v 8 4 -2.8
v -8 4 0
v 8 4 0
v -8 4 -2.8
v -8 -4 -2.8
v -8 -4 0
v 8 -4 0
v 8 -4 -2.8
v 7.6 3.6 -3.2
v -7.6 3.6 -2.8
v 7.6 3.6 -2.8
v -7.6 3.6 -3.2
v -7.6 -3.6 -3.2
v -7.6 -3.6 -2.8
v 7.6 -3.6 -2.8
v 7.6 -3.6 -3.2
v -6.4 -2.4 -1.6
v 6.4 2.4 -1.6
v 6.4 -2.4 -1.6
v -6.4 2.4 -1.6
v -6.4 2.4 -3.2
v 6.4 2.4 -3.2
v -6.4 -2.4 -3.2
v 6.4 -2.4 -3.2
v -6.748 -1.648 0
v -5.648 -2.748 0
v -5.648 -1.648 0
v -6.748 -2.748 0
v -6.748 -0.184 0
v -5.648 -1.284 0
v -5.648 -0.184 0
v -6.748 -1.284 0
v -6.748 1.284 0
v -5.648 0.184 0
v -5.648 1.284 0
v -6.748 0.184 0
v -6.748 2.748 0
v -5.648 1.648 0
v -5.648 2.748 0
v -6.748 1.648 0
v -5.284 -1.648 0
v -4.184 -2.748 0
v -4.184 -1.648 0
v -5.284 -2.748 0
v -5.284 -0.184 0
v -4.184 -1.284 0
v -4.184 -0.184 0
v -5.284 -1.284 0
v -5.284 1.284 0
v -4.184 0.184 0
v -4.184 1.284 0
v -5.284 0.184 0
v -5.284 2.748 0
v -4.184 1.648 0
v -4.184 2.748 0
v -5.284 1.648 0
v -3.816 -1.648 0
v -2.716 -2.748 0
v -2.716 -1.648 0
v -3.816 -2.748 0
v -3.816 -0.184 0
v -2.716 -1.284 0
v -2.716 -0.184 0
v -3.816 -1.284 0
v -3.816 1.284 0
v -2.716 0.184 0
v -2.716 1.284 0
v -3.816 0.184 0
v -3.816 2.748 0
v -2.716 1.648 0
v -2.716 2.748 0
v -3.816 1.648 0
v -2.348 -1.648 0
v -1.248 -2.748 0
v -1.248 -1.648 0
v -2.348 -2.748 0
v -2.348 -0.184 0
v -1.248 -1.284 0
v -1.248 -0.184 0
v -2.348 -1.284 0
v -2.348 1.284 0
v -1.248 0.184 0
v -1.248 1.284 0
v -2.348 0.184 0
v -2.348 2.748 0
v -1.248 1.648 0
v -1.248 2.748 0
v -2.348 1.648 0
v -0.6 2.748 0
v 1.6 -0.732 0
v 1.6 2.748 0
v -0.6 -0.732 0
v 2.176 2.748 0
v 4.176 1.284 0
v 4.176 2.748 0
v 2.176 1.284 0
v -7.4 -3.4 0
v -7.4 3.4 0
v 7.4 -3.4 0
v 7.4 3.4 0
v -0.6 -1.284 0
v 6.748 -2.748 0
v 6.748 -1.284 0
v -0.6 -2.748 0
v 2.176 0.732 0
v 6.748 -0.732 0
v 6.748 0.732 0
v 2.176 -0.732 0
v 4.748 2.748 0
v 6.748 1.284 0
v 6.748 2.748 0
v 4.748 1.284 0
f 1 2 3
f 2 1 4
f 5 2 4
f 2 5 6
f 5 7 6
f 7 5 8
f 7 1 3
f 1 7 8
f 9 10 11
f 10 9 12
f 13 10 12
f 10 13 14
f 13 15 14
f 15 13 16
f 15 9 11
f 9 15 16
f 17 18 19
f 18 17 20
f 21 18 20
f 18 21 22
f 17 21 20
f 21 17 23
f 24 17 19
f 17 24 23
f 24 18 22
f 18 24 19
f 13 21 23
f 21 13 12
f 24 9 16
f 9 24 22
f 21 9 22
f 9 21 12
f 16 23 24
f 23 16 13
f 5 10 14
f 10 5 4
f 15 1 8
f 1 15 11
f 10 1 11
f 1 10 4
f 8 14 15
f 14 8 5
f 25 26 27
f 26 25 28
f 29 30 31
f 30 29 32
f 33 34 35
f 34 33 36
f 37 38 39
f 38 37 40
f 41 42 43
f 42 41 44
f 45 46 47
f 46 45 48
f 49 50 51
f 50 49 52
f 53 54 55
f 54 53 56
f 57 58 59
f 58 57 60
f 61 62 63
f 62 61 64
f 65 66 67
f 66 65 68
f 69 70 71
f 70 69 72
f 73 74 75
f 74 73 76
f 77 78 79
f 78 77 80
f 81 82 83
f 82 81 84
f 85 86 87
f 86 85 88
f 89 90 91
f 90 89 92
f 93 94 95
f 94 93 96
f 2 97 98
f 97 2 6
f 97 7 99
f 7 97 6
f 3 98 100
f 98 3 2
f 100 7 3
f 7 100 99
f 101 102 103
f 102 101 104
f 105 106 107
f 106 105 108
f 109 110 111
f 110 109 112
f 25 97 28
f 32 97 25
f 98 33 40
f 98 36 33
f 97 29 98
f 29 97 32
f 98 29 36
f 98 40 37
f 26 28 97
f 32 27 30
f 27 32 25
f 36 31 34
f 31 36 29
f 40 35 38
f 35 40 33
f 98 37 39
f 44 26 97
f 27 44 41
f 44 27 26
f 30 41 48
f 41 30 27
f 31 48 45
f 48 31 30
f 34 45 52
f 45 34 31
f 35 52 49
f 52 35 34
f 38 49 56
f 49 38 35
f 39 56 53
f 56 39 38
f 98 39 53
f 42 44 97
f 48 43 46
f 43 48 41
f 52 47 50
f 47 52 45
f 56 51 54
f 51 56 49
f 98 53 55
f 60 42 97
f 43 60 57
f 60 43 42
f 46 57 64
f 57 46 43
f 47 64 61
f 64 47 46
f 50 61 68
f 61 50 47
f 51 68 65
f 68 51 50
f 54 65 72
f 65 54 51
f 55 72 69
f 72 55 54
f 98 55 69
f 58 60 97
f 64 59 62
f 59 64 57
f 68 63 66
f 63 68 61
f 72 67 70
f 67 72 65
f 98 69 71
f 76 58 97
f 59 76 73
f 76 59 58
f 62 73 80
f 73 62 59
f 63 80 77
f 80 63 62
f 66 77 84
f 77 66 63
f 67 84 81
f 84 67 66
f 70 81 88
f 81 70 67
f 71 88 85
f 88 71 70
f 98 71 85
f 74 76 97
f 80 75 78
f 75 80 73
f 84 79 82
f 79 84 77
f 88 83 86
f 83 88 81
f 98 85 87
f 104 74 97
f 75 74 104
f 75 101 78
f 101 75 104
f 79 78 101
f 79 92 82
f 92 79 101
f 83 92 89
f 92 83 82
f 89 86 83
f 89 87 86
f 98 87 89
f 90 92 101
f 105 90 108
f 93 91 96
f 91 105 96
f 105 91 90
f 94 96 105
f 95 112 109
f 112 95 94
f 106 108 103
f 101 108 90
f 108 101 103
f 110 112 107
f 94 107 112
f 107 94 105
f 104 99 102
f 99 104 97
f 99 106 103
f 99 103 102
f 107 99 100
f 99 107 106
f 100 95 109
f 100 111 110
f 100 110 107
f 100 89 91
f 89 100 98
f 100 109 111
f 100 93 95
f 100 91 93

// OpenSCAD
// file: ../p/4-4edge.scad
use <../lib.scad>
$fa=1; $fs=0.2;
function ldraw_lib__4_4edge(realsolid=false) = [
// 0 Circle 1.0
// 0 Name: 4-4edge.dat
// 0 Author: James Jessiman
// 0 !LDRAW_ORG Primitive UPDATE 2017-01
// 0 !LICENSE Licensed under CC BY 2.0 and CC BY 4.0 : see CAreadme.txt
// 
// 0 BFC CERTIFY CCW
  [0,"BFC","CERTIFY"],
  [0,"BFC","CCW"],
// 
// 0 !HISTORY 1998-12-15 [PTadmin] Official Update 1998-10
// 0 !HISTORY 2005-12-28 [PTadmin] Official Update 2005-01
// 0 !HISTORY 2007-06-24 [PTadmin] Header formatted for Contributor Agreement
// 0 !HISTORY 2008-07-01 [PTadmin] Official Update 2008-01
// 0 !HISTORY 2017-01-15 [Steffen] BFCed
// 0 !HISTORY 2017-12-30 [PTadmin] Official Update 2017-01
// 
// 
// 2 24 1 0 0 0.9239 0 0.3827
  [2,24,1,0,0,0.9239,0,0.3827],
// 2 24 0.9239 0 0.3827 0.7071 0 0.7071
  [2,24,0.9239,0,0.3827,0.7071,0,0.7071],
// 2 24 0.7071 0 0.7071 0.3827 0 0.9239
  [2,24,0.7071,0,0.7071,0.3827,0,0.9239],
// 2 24 0.3827 0 0.9239 0 0 1
  [2,24,0.3827,0,0.9239,0,0,1],
// 2 24 0 0 1 -0.3827 0 0.9239
  [2,24,0,0,1,-0.3827,0,0.9239],
// 2 24 -0.3827 0 0.9239 -0.7071 0 0.7071
  [2,24,-0.3827,0,0.9239,-0.7071,0,0.7071],
// 2 24 -0.7071 0 0.7071 -0.9239 0 0.3827
  [2,24,-0.7071,0,0.7071,-0.9239,0,0.3827],
// 2 24 -0.9239 0 0.3827 -1 0 -0
  [2,24,-0.9239,0,0.3827,-1,0,-0],
// 2 24 -1 0 -0 -0.9239 0 -0.3827
  [2,24,-1,0,-0,-0.9239,0,-0.3827],
// 2 24 -0.9239 0 -0.3827 -0.7071 0 -0.7071
  [2,24,-0.9239,0,-0.3827,-0.7071,0,-0.7071],
// 2 24 -0.7071 0 -0.7071 -0.3827 0 -0.9239
  [2,24,-0.7071,0,-0.7071,-0.3827,0,-0.9239],
// 2 24 -0.3827 0 -0.9239 0 0 -1
  [2,24,-0.3827,0,-0.9239,0,0,-1],
// 2 24 0 0 -1 0.3827 0 -0.9239
  [2,24,0,0,-1,0.3827,0,-0.9239],
// 2 24 0.3827 0 -0.9239 0.7071 0 -0.7071
  [2,24,0.3827,0,-0.9239,0.7071,0,-0.7071],
// 2 24 0.7071 0 -0.7071 0.9239 0 -0.3827
  [2,24,0.7071,0,-0.7071,0.9239,0,-0.3827],
// 2 24 0.9239 0 -0.3827 1 0 0
  [2,24,0.9239,0,-0.3827,1,0,0],
];
module ldraw_lib__4_4edge(step=0, col=false, unit=2/5, alt=false, line=0.2, solid=!$preview)
    makepoly(ldraw_lib__4_4edge(solid), step=step, col=col, unit=unit, alt=alt, line=line, solid=solid);
ldraw_lib__4_4edge(line=0.2);
// file: ../p/4-4disc.scad
use <../lib.scad>
$fa=1; $fs=0.2;
function ldraw_lib__4_4disc(realsolid=false) = [
// 0 Disc 1.0
// 0 Name: 4-4disc.dat
// 0 Author: James Jessiman
// 0 !LDRAW_ORG Primitive UPDATE 2002-02
// 0 !LICENSE Licensed under CC BY 2.0 and CC BY 4.0 : see CAreadme.txt
// 
// 0 BFC CERTIFY CCW
  [0,"BFC","CERTIFY"],
  [0,"BFC","CCW"],
// 
// 0 !HISTORY 1998-12-15 [PTadmin] Official Update 1998-10
// 0 !HISTORY 2002-03-23 [sbliss] Added BFC statement
// 0 !HISTORY 2002-04-25 [PTadmin] Official Update 2002-02
// 0 !HISTORY 2007-06-24 [PTadmin] Header formatted for Contributor Agreement
// 0 !HISTORY 2008-07-01 [PTadmin] Official Update 2008-01
// 
// 
// 3 16 0 0 0 1 0 0 0.9239 0 0.3827
  [3,16,0,0,0,1,0,0,0.9239,0,0.3827],
// 3 16 0 0 0 0.9239 0 0.3827 0.7071 0 0.7071
  [3,16,0,0,0,0.9239,0,0.3827,0.7071,0,0.7071],
// 3 16 0 0 0 0.7071 0 0.7071 0.3827 0 0.9239
  [3,16,0,0,0,0.7071,0,0.7071,0.3827,0,0.9239],
// 3 16 0 0 0 0.3827 0 0.9239 0 0 1
  [3,16,0,0,0,0.3827,0,0.9239,0,0,1],
// 3 16 0 0 0 0 0 1 -0.3827 0 0.9239
  [3,16,0,0,0,0,0,1,-0.3827,0,0.9239],
// 3 16 0 0 0 -0.3827 0 0.9239 -0.7071 0 0.7071
  [3,16,0,0,0,-0.3827,0,0.9239,-0.7071,0,0.7071],
// 3 16 0 0 0 -0.7071 0 0.7071 -0.9239 0 0.3827
  [3,16,0,0,0,-0.7071,0,0.7071,-0.9239,0,0.3827],
// 3 16 0 0 0 -0.9239 0 0.3827 -1 0 -0
  [3,16,0,0,0,-0.9239,0,0.3827,-1,0,-0],
// 3 16 0 0 0 -1 0 -0 -0.9239 0 -0.3827
  [3,16,0,0,0,-1,0,-0,-0.9239,0,-0.3827],
// 3 16 0 0 0 -0.9239 0 -0.3827 -0.7071 0 -0.7071
  [3,16,0,0,0,-0.9239,0,-0.3827,-0.7071,0,-0.7071],
// 3 16 0 0 0 -0.7071 0 -0.7071 -0.3827 0 -0.9239
  [3,16,0,0,0,-0.7071,0,-0.7071,-0.3827,0,-0.9239],
// 3 16 0 0 0 -0.3827 0 -0.9239 0 0 -1
  [3,16,0,0,0,-0.3827,0,-0.9239,0,0,-1],
// 3 16 0 0 0 0 0 -1 0.3827 0 -0.9239
  [3,16,0,0,0,0,0,-1,0.3827,0,-0.9239],
// 3 16 0 0 0 0.3827 0 -0.9239 0.7071 0 -0.7071
  [3,16,0,0,0,0.3827,0,-0.9239,0.7071,0,-0.7071],
// 3 16 0 0 0 0.7071 0 -0.7071 0.9239 0 -0.3827
  [3,16,0,0,0,0.7071,0,-0.7071,0.9239,0,-0.3827],
// 3 16 0 0 0 0.9239 0 -0.3827 1 0 0
  [3,16,0,0,0,0.9239,0,-0.3827,1,0,0],
// 0
];
module ldraw_lib__4_4disc(step=0, col=false, unit=2/5, alt=false, line=0.2, solid=!$preview)
    makepoly(ldraw_lib__4_4disc(solid), step=step, col=col, unit=unit, alt=alt, line=line, solid=solid);
ldraw_lib__4_4disc(line=0.2);
// file: ../p/4-4cyli.scad
use <../lib.scad>
$fa=1; $fs=0.2;
function ldraw_lib__4_4cyli(realsolid=false) = [
// 0 Cylinder 1.0
// 0 Name: 4-4cyli.dat
// 0 Author: James Jessiman
// 0 !LDRAW_ORG Primitive UPDATE 2005-01
// 0 !LICENSE Licensed under CC BY 2.0 and CC BY 4.0 : see CAreadme.txt
// 
// 0 BFC CERTIFY CCW
  [0,"BFC","CERTIFY"],
  [0,"BFC","CCW"],
// 
// 0 !HISTORY 1998-12-15 [PTadmin] Official Update 1998-10
// 0 !HISTORY 2002-03-23 [sbliss] Added BFC statement; merged headers from files in distributions LDraw 0.27 and Complete.
// 0 !HISTORY 2002-04-25 [PTadmin] Official Update 2002-02
// 0 !HISTORY 2004-12-14 [guyvivan] BFC CCW
// 0 !HISTORY 2005-12-28 [PTadmin] Official Update 2005-01
// 0 !HISTORY 2007-06-24 [PTadmin] Header formatted for Contributor Agreement
// 0 !HISTORY 2008-07-01 [PTadmin] Official Update 2008-01
// 
// 
// 4 16 1 1 0 0.9239 1 0.3827 0.9239 0 0.3827 1 0 0
  [4,16,1,1,0,0.9239,1,0.3827,0.9239,0,0.3827,1,0,0],
// 5 24 1 0 0 1 1 0 0.9239 0 0.3827 0.9239 0 -0.3827
  [5,24,1,0,0,1,1,0,0.9239,0,0.3827,0.9239,0,-0.3827],
// 4 16 0.9239 1 0.3827 0.7071 1 0.7071 0.7071 0 0.7071 0.9239 0 0.3827
  [4,16,0.9239,1,0.3827,0.7071,1,0.7071,0.7071,0,0.7071,0.9239,0,0.3827],
// 5 24 0.9239 0 0.3827 0.9239 1 0.3827 0.7071 0 0.7071 1 0 0
  [5,24,0.9239,0,0.3827,0.9239,1,0.3827,0.7071,0,0.7071,1,0,0],
// 4 16 0.7071 1 0.7071 0.3827 1 0.9239 0.3827 0 0.9239 0.7071 0 0.7071
  [4,16,0.7071,1,0.7071,0.3827,1,0.9239,0.3827,0,0.9239,0.7071,0,0.7071],
// 5 24 0.7071 0 0.7071 0.7071 1 0.7071 0.3827 0 0.9239 0.9239 0 0.3827
  [5,24,0.7071,0,0.7071,0.7071,1,0.7071,0.3827,0,0.9239,0.9239,0,0.3827],
// 4 16 0.3827 1 0.9239 0 1 1 0 0 1 0.3827 0 0.9239
  [4,16,0.3827,1,0.9239,0,1,1,0,0,1,0.3827,0,0.9239],
// 5 24 0.3827 0 0.9239 0.3827 1 0.9239 0 0 1 0.7071 0 0.7071
  [5,24,0.3827,0,0.9239,0.3827,1,0.9239,0,0,1,0.7071,0,0.7071],
// 4 16 0 1 1 -0.3827 1 0.9239 -0.3827 0 0.9239 0 0 1
  [4,16,0,1,1,-0.3827,1,0.9239,-0.3827,0,0.9239,0,0,1],
// 5 24 0 0 1 0 1 1 -0.3827 0 0.9239 0.3827 0 0.9239
  [5,24,0,0,1,0,1,1,-0.3827,0,0.9239,0.3827,0,0.9239],
// 4 16 -0.3827 1 0.9239 -0.7071 1 0.7071 -0.7071 0 0.7071 -0.3827 0 0.9239
  [4,16,-0.3827,1,0.9239,-0.7071,1,0.7071,-0.7071,0,0.7071,-0.3827,0,0.9239],
// 5 24 -0.3827 0 0.9239 -0.3827 1 0.9239 -0.7071 0 0.7071 0 0 1
  [5,24,-0.3827,0,0.9239,-0.3827,1,0.9239,-0.7071,0,0.7071,0,0,1],
// 4 16 -0.7071 1 0.7071 -0.9239 1 0.3827 -0.9239 0 0.3827 -0.7071 0 0.7071
  [4,16,-0.7071,1,0.7071,-0.9239,1,0.3827,-0.9239,0,0.3827,-0.7071,0,0.7071],
// 5 24 -0.7071 0 0.7071 -0.7071 1 0.7071 -0.9239 0 0.3827 -0.3827 0 0.9239
  [5,24,-0.7071,0,0.7071,-0.7071,1,0.7071,-0.9239,0,0.3827,-0.3827,0,0.9239],
// 4 16 -0.9239 1 0.3827 -1 1 0 -1 0 0 -0.9239 0 0.3827
  [4,16,-0.9239,1,0.3827,-1,1,0,-1,0,0,-0.9239,0,0.3827],
// 5 24 -0.9239 0 0.3827 -0.9239 1 0.3827 -1 0 0 -0.7071 0 0.7071
  [5,24,-0.9239,0,0.3827,-0.9239,1,0.3827,-1,0,0,-0.7071,0,0.7071],
// 4 16 -1 1 0 -0.9239 1 -0.3827 -0.9239 0 -0.3827 -1 0 0
  [4,16,-1,1,0,-0.9239,1,-0.3827,-0.9239,0,-0.3827,-1,0,0],
// 5 24 -1 0 0 -1 1 0 -0.9239 0 -0.3827 -0.9239 0 0.3827
  [5,24,-1,0,0,-1,1,0,-0.9239,0,-0.3827,-0.9239,0,0.3827],
// 4 16 -0.9239 1 -0.3827 -0.7071 1 -0.7071 -0.7071 0 -0.7071 -0.9239 0 -0.3827
  [4,16,-0.9239,1,-0.3827,-0.7071,1,-0.7071,-0.7071,0,-0.7071,-0.9239,0,-0.3827],
// 5 24 -0.9239 0 -0.3827 -0.9239 1 -0.3827 -0.7071 0 -0.7071 -1 0 0
  [5,24,-0.9239,0,-0.3827,-0.9239,1,-0.3827,-0.7071,0,-0.7071,-1,0,0],
// 4 16 -0.7071 1 -0.7071 -0.3827 1 -0.9239 -0.3827 0 -0.9239 -0.7071 0 -0.7071
  [4,16,-0.7071,1,-0.7071,-0.3827,1,-0.9239,-0.3827,0,-0.9239,-0.7071,0,-0.7071],
// 5 24 -0.7071 0 -0.7071 -0.7071 1 -0.7071 -0.3827 0 -0.9239 -0.9239 0 -0.3827
  [5,24,-0.7071,0,-0.7071,-0.7071,1,-0.7071,-0.3827,0,-0.9239,-0.9239,0,-0.3827],
// 4 16 -0.3827 1 -0.9239 0 1 -1 0 0 -1 -0.3827 0 -0.9239
  [4,16,-0.3827,1,-0.9239,0,1,-1,0,0,-1,-0.3827,0,-0.9239],
// 5 24 -0.3827 0 -0.9239 -0.3827 1 -0.9239 0 0 -1 -0.7071 0 -0.7071
  [5,24,-0.3827,0,-0.9239,-0.3827,1,-0.9239,0,0,-1,-0.7071,0,-0.7071],
// 4 16 0 1 -1 0.3827 1 -0.9239 0.3827 0 -0.9239 0 0 -1
  [4,16,0,1,-1,0.3827,1,-0.9239,0.3827,0,-0.9239,0,0,-1],
// 5 24 0 0 -1 0 1 -1 0.3827 0 -0.9239 -0.3827 0 -0.9239
  [5,24,0,0,-1,0,1,-1,0.3827,0,-0.9239,-0.3827,0,-0.9239],
// 4 16 0.3827 1 -0.9239 0.7071 1 -0.7071 0.7071 0 -0.7071 0.3827 0 -0.9239
  [4,16,0.3827,1,-0.9239,0.7071,1,-0.7071,0.7071,0,-0.7071,0.3827,0,-0.9239],
// 5 24 0.3827 0 -0.9239 0.3827 1 -0.9239 0.7071 0 -0.7071 0 0 -1
  [5,24,0.3827,0,-0.9239,0.3827,1,-0.9239,0.7071,0,-0.7071,0,0,-1],
// 4 16 0.7071 1 -0.7071 0.9239 1 -0.3827 0.9239 0 -0.3827 0.7071 0 -0.7071
  [4,16,0.7071,1,-0.7071,0.9239,1,-0.3827,0.9239,0,-0.3827,0.7071,0,-0.7071],
// 5 24 0.7071 0 -0.7071 0.7071 1 -0.7071 0.9239 0 -0.3827 0.3827 0 -0.9239
  [5,24,0.7071,0,-0.7071,0.7071,1,-0.7071,0.9239,0,-0.3827,0.3827,0,-0.9239],
// 4 16 0.9239 1 -0.3827 1 1 0 1 0 0 0.9239 0 -0.3827
  [4,16,0.9239,1,-0.3827,1,1,0,1,0,0,0.9239,0,-0.3827],
// 5 24 0.9239 0 -0.3827 0.9239 1 -0.3827 1 0 0 0.7071 0 -0.7071
  [5,24,0.9239,0,-0.3827,0.9239,1,-0.3827,1,0,0,0.7071,0,-0.7071],
// 0
];
module ldraw_lib__4_4cyli(step=0, col=false, unit=2/5, alt=false, line=0.2, solid=!$preview)
    makepoly(ldraw_lib__4_4cyli(solid), step=step, col=col, unit=unit, alt=alt, line=line, solid=solid);
ldraw_lib__4_4cyli(line=0.2);
// file: ../p/stud3.scad
use <../lib.scad>
use <4-4cyli.scad>
use <4-4disc.scad>
use <4-4edge.scad>
$fa=1; $fs=0.2;
function ldraw_lib__stud3(realsolid=false) = realsolid ? 
    [openscad(translate([0,0,-eps()], o=cylinder(4+eps(), r=4)),2)] : [
// 0 Stud Tube Solid
// 0 Name: stud3.dat
// 0 Author: James Jessiman
// 0 !LDRAW_ORG Primitive UPDATE 2012-01
// 0 !LICENSE Licensed under CC BY 2.0 and CC BY 4.0 : see CAreadme.txt
// 
// 0 BFC CERTIFY CCW
  [0,"BFC","CERTIFY"],
  [0,"BFC","CCW"],
// 
// 0 !HISTORY 2002-04-04 [sbliss] Modified for BFC compliance
// 0 !HISTORY 2002-04-25 [PTadmin] Official Update 2002-02
// 0 !HISTORY 2007-06-24 [PTadmin] Header formatted for Contributor Agreement
// 0 !HISTORY 2008-07-01 [PTadmin] Official Update 2008-01
// 0 !HISTORY 2012-02-16 [Philo] Changed to CCW
// 0 !HISTORY 2012-03-30 [PTadmin] Official Update 2012-01
// 
// 
// 1 16 0 -4 0 4 0 0 0 1 0 0 0 4 4-4edge.dat
  [1,16,0,-4,0,4,0,0,0,1,0,0,0,4, ldraw_lib__4_4edge(realsolid)],
// 1 16 0 0 0 4 0 0 0 1 0 0 0 4 4-4edge.dat
  [1,16,0,0,0,4,0,0,0,1,0,0,0,4, ldraw_lib__4_4edge(realsolid)],
// 1 16 0 -4 0 4 0 0 0 1 0 0 0 4 4-4disc.dat
  [1,16,0,-4,0,4,0,0,0,1,0,0,0,4, ldraw_lib__4_4disc(realsolid)],
// 1 16 0 -4 0 4 0 0 0 4 0 0 0 4 4-4cyli.dat
  [1,16,0,-4,0,4,0,0,0,4,0,0,0,4, ldraw_lib__4_4cyli(realsolid)],
];
module ldraw_lib__stud3(step=0, col=false, unit=2/5, alt=false, line=0.2, solid=!$preview)
    makepoly(ldraw_lib__stud3(solid), step=step, col=col, unit=unit, alt=alt, line=line, solid=solid);
ldraw_lib__stud3(line=0.2);
// file: ../p/stud.scad
use <../lib.scad>
use <4-4cyli.scad>
use <4-4disc.scad>
use <4-4edge.scad>
$fa=1; $fs=0.2;
function ldraw_lib__stud(realsolid=false) = realsolid ? 
    [openscad(translate([0,0,-eps()], o=cylinder(4+eps(), r=6)),2)] : [
// 0 Stud
// 0 Name: stud.dat
// 0 Author: James Jessiman
// 0 !LDRAW_ORG Primitive UPDATE 2012-01
// 0 !LICENSE Licensed under CC BY 2.0 and CC BY 4.0 : see CAreadme.txt
// 
// 0 BFC CERTIFY CCW
  [0,"BFC","CERTIFY"],
  [0,"BFC","CCW"],
// 
// 0 !HISTORY 2002-04-04 [sbliss] Modified for BFC compliance
// 0 !HISTORY 2002-04-25 [PTadmin] Official Update 2002-02
// 0 !HISTORY 2007-06-24 [PTadmin] Header formatted for Contributor Agreement
// 0 !HISTORY 2008-07-01 [PTadmin] Official Update 2008-01
// 0 !HISTORY 2012-02-16 [Philo] Changed to CCW
// 0 !HISTORY 2012-03-30 [PTadmin] Official Update 2012-01
// 
// 
// 1 16 0 0 0 6 0 0 0 1 0 0 0 6 4-4edge.dat
  [1,16,0,0,0,6,0,0,0,1,0,0,0,6, ldraw_lib__4_4edge(realsolid)],
// 1 16 0 -4 0 6 0 0 0 1 0 0 0 6 4-4edge.dat
  [1,16,0,-4,0,6,0,0,0,1,0,0,0,6, ldraw_lib__4_4edge(realsolid)],
// 1 16 0 0 0 6 0 0 0 -4 0 0 0 6 4-4cyli.dat
  [1,16,0,0,0,6,0,0,0,-4,0,0,0,6, ldraw_lib__4_4cyli(realsolid)],
// 1 16 0 -4 0 6 0 0 0 1 0 0 0 6 4-4disc.dat
  [1,16,0,-4,0,6,0,0,0,1,0,0,0,6, ldraw_lib__4_4disc(realsolid)],
];
module ldraw_lib__stud(step=0, col=false, unit=2/5, alt=false, line=0.2, solid=!$preview)
    makepoly(ldraw_lib__stud(solid), step=step, col=col, unit=unit, alt=alt, line=line, solid=solid);
ldraw_lib__stud(line=0.2);
// file: ../p/box4t.scad
use <../lib.scad>
$fa=1; $fs=0.2;
function ldraw_lib__box4t(realsolid=false) = [
// 0 Box with 4 Adjacent Faces and All Edges
// 0 Name: box4t.dat
// 0 Author: Tore Eriksson [Tore_Eriksson]
// 0 !LDRAW_ORG Primitive UPDATE 2003-02
// 0 !LICENSE Licensed under CC BY 2.0 and CC BY 4.0 : see CAreadme.txt
// 
// 0 BFC CERTIFY CCW
  [0,"BFC","CERTIFY"],
  [0,"BFC","CCW"],
// 
// 0 !HISTORY 1997-09-29 [PTadmin] Official Update 1997-15
// 0 !HISTORY 2002-08-31 [izanette] Modified with WINDZ for BFC compliance
// 0 !HISTORY 2003-08-01 [PTadmin] Official Update 2003-02
// 0 !HISTORY 2007-06-24 [PTadmin] Header formatted for Contributor Agreement
// 0 !HISTORY 2008-07-01 [PTadmin] Official Update 2008-01
// 
// 
// 2 24 1 1 1 -1 1 1
  [2,24,1,1,1,-1,1,1],
// 2 24 -1 1 1 -1 1 -1
  [2,24,-1,1,1,-1,1,-1],
// 2 24 -1 1 -1 1 1 -1
  [2,24,-1,1,-1,1,1,-1],
// 2 24 1 1 -1 1 1 1
  [2,24,1,1,-1,1,1,1],
// 2 24 1 0 1 -1 0 1
  [2,24,1,0,1,-1,0,1],
// 2 24 -1 0 1 -1 0 -1
  [2,24,-1,0,1,-1,0,-1],
// 2 24 -1 0 -1 1 0 -1
  [2,24,-1,0,-1,1,0,-1],
// 2 24 1 0 -1 1 0 1
  [2,24,1,0,-1,1,0,1],
// 2 24 1 0 1 1 1 1
  [2,24,1,0,1,1,1,1],
// 2 24 -1 0 1 -1 1 1
  [2,24,-1,0,1,-1,1,1],
// 2 24 1 0 -1 1 1 -1
  [2,24,1,0,-1,1,1,-1],
// 2 24 -1 0 -1 -1 1 -1
  [2,24,-1,0,-1,-1,1,-1],
// 4 16 1 1 1 1 1 -1 -1 1 -1 -1 1 1
  [4,16,1,1,1,1,1,-1,-1,1,-1,-1,1,1],
// 4 16 1 1 1 -1 1 1 -1 0 1 1 0 1
  [4,16,1,1,1,-1,1,1,-1,0,1,1,0,1],
// 4 16 -1 1 1 -1 1 -1 -1 0 -1 -1 0 1
  [4,16,-1,1,1,-1,1,-1,-1,0,-1,-1,0,1],
// 0 4 16 -1 1 -1 -1 0 -1 1 0 -1 1 1 -1
// 4 16 1 1 -1 1 1 1 1 0 1 1 0 -1
  [4,16,1,1,-1,1,1,1,1,0,1,1,0,-1],
// 0
];
module ldraw_lib__box4t(step=0, col=false, unit=2/5, alt=false, line=0.2, solid=!$preview)
    makepoly(ldraw_lib__box4t(solid), step=step, col=col, unit=unit, alt=alt, line=line, solid=solid);
ldraw_lib__box4t(line=0.2);
// file: s/3004s01.scad
use <../../lib.scad>
use <../../p/box4t.scad>
use <../../p/box5.scad>
use <../../p/stud.scad>
use <../../p/stud3.scad>
$fa=1; $fs=0.2;
function ldraw_lib__s__3004s01(realsolid=false) = [
// 0 ~Brick  1 x  2 without Front Face
// 0 Name: s\3004s01.dat
// 0 Author: James Jessiman
// 0 !LDRAW_ORG Subpart UPDATE 2003-03
// 0 !LICENSE Licensed under CC BY 2.0 and CC BY 4.0 : see CAreadme.txt
// 
// 0 BFC CERTIFY CCW
  [0,"BFC","CERTIFY"],
  [0,"BFC","CCW"],
// 
// 0 !HISTORY 2003-09-07 [jriley] Subfiling, BFC
// 0 !HISTORY 2003-12-19 [PTadmin] Official Update 2003-03
// 0 !HISTORY 2007-08-29 [PTadmin] Header formatted for Contributor Agreement
// 0 !HISTORY 2008-07-01 [PTadmin] Official Update 2008-01
// 
// 
// 1 16 0 4 0 1 0 0 0 -5 0 0 0 1 stud3.dat
  [1,16,0,4,0,1,0,0,0,-5,0,0,0,1, ldraw_lib__stud3(realsolid)],
// 0 BFC INVERTNEXT
  [0,"BFC","INVERTNEXT"],
// 1 16 0 24 0 16 0 0 0 -20 0 0 0 6 box5.dat
  [1,16,0,24,0,16,0,0,0,-20,0,0,0,6, ldraw_lib__box5(realsolid)],
// 4 16 20 24 10 16 24 6 -16 24 6 -20 24 10
  [4,16,20,24,10,16,24,6,-16,24,6,-20,24,10],
// 4 16 -20 24 10 -16 24 6 -16 24 -6 -20 24 -10
  [4,16,-20,24,10,-16,24,6,-16,24,-6,-20,24,-10],
// 4 16 -20 24 -10 -16 24 -6 16 24 -6 20 24 -10
  [4,16,-20,24,-10,-16,24,-6,16,24,-6,20,24,-10],
// 4 16 20 24 -10 16 24 -6 16 24 6 20 24 10
  [4,16,20,24,-10,16,24,-6,16,24,6,20,24,10],
// 1 16 0 24 0 20 0 0 0 -24 0 0 0 10 box4t.dat
  [1,16,0,24,0,20,0,0,0,-24,0,0,0,10, ldraw_lib__box4t(realsolid)],
// 1 16 10 0 0 1 0 0 0 1 0 0 0 1 stud.dat
  [1,16,10,0,0,1,0,0,0,1,0,0,0,1, ldraw_lib__stud(realsolid)],
// 1 16 -10 0 0 1 0 0 0 1 0 0 0 1 stud.dat
  [1,16,-10,0,0,1,0,0,0,1,0,0,0,1, ldraw_lib__stud(realsolid)],
// 0
];
module ldraw_lib__s__3004s01(step=0, col=false, unit=2/5, alt=false, line=0.2, solid=!$preview)
    makepoly(ldraw_lib__s__3004s01(solid), step=step, col=col, unit=unit, alt=alt, line=line, solid=solid);
ldraw_lib__s__3004s01(line=0.2);
// file: ../p/box5.scad
use <../lib.scad>
$fa=1; $fs=0.2;
function ldraw_lib__box5(realsolid=false) = [
// 0 Box with 5 Faces and All Edges
// 0 Name: box5.dat
// 0 Author: James Jessiman
// 0 !LDRAW_ORG Primitive UPDATE 2012-01
// 0 !LICENSE Licensed under CC BY 2.0 and CC BY 4.0 : see CAreadme.txt
// 
// 0 BFC CERTIFY CCW
  [0,"BFC","CERTIFY"],
  [0,"BFC","CCW"],
// 
// 0 !HISTORY 2002-04-03 [sbliss] Modified for BFC compliance
// 0 !HISTORY 2002-04-25 [PTadmin] Official Update 2002-02
// 0 !HISTORY 2007-06-24 [PTadmin] Header formatted for Contributor Agreement
// 0 !HISTORY 2008-07-01 [PTadmin] Official Update 2008-01
// 0 !HISTORY 2012-02-16 [Philo] Changed to CCW
// 0 !HISTORY 2012-03-30 [PTadmin] Official Update 2012-01
// 
// 
// 2 24 1 1 1 -1 1 1
  [2,24,1,1,1,-1,1,1],
// 2 24 -1 1 1 -1 1 -1
  [2,24,-1,1,1,-1,1,-1],
// 2 24 -1 1 -1 1 1 -1
  [2,24,-1,1,-1,1,1,-1],
// 2 24 1 1 -1 1 1 1
  [2,24,1,1,-1,1,1,1],
// 2 24 1 0 1 -1 0 1
  [2,24,1,0,1,-1,0,1],
// 2 24 -1 0 1 -1 0 -1
  [2,24,-1,0,1,-1,0,-1],
// 2 24 -1 0 -1 1 0 -1
  [2,24,-1,0,-1,1,0,-1],
// 2 24 1 0 -1 1 0 1
  [2,24,1,0,-1,1,0,1],
// 2 24 1 0 1 1 1 1
  [2,24,1,0,1,1,1,1],
// 2 24 -1 0 1 -1 1 1
  [2,24,-1,0,1,-1,1,1],
// 2 24 1 0 -1 1 1 -1
  [2,24,1,0,-1,1,1,-1],
// 2 24 -1 0 -1 -1 1 -1
  [2,24,-1,0,-1,-1,1,-1],
// 4 16 -1 1 1 1 1 1 1 1 -1 -1 1 -1
  [4,16,-1,1,1,1,1,1,1,1,-1,-1,1,-1],
// 4 16 -1 1 1 -1 0 1 1 0 1 1 1 1
  [4,16,-1,1,1,-1,0,1,1,0,1,1,1,1],
// 4 16 -1 1 -1 -1 0 -1 -1 0 1 -1 1 1
  [4,16,-1,1,-1,-1,0,-1,-1,0,1,-1,1,1],
// 4 16 1 1 -1 1 0 -1 -1 0 -1 -1 1 -1
  [4,16,1,1,-1,1,0,-1,-1,0,-1,-1,1,-1],
// 4 16 1 1 1 1 0 1 1 0 -1 1 1 -1
  [4,16,1,1,1,1,0,1,1,0,-1,1,1,-1],
];
module ldraw_lib__box5(step=0, col=false, unit=2/5, alt=false, line=0.2, solid=!$preview)
    makepoly(ldraw_lib__box5(solid), step=step, col=col, unit=unit, alt=alt, line=line, solid=solid);
ldraw_lib__box5(line=0.2);
// file: ../p/box4.scad
use <../lib.scad>
$fa=1; $fs=0.2;
function ldraw_lib__box4(realsolid=false) = [
// 0 Box with 4 Faces (2 Parallel Pairs) and All Edges
// 0 Name: box4.dat
// 0 Author: James Jessiman
// 0 !LDRAW_ORG Primitive UPDATE 2012-01
// 0 !LICENSE Licensed under CC BY 2.0 and CC BY 4.0 : see CAreadme.txt
// 
// 0 BFC CERTIFY CCW
  [0,"BFC","CERTIFY"],
  [0,"BFC","CCW"],
// 
// 0 !HISTORY 2002-04-03 [sbliss] Modified for BFC compliance
// 0 !HISTORY 2002-04-25 [PTadmin] Official Update 2002-02
// 0 !HISTORY 2007-06-24 [PTadmin] Header formatted for Contributor Agreement
// 0 !HISTORY 2008-07-01 [PTadmin] Official Update 2008-01
// 0 !HISTORY 2012-02-16 [Philo] Changed to CCW
// 0 !HISTORY 2012-03-30 [PTadmin] Official Update 2012-01
// 
// 
// 2 24 1 1 1 -1 1 1
  [2,24,1,1,1,-1,1,1],
// 2 24 -1 1 1 -1 1 -1
  [2,24,-1,1,1,-1,1,-1],
// 2 24 -1 1 -1 1 1 -1
  [2,24,-1,1,-1,1,1,-1],
// 2 24 1 1 -1 1 1 1
  [2,24,1,1,-1,1,1,1],
// 2 24 1 0 1 -1 0 1
  [2,24,1,0,1,-1,0,1],
// 2 24 -1 0 1 -1 0 -1
  [2,24,-1,0,1,-1,0,-1],
// 2 24 -1 0 -1 1 0 -1
  [2,24,-1,0,-1,1,0,-1],
// 2 24 1 0 -1 1 0 1
  [2,24,1,0,-1,1,0,1],
// 2 24 1 0 1 1 1 1
  [2,24,1,0,1,1,1,1],
// 2 24 -1 0 1 -1 1 1
  [2,24,-1,0,1,-1,1,1],
// 2 24 1 0 -1 1 1 -1
  [2,24,1,0,-1,1,1,-1],
// 2 24 -1 0 -1 -1 1 -1
  [2,24,-1,0,-1,-1,1,-1],
// 4 16 -1 1 1 -1 0 1 1 0 1 1 1 1
  [4,16,-1,1,1,-1,0,1,1,0,1,1,1,1],
// 4 16 -1 1 -1 -1 0 -1 -1 0 1 -1 1 1
  [4,16,-1,1,-1,-1,0,-1,-1,0,1,-1,1,1],
// 4 16 1 1 -1 1 0 -1 -1 0 -1 -1 1 -1
  [4,16,1,1,-1,1,0,-1,-1,0,-1,-1,1,-1],
// 4 16 1 1 1 1 0 1 1 0 -1 1 1 -1
  [4,16,1,1,1,1,0,1,1,0,-1,1,1,-1],
];
module ldraw_lib__box4(step=0, col=false, unit=2/5, alt=false, line=0.2, solid=!$preview)
    makepoly(ldraw_lib__box4(solid), step=step, col=col, unit=unit, alt=alt, line=line, solid=solid);
ldraw_lib__box4(line=0.2);
// file: 3004.scad
use <../lib.scad>
use <s/3004s01.scad>
$fa=1; $fs=0.2;
function ldraw_lib__3004(realsolid=false) = [
// 0 Brick  1 x  2
// 0 Name: 3004.dat
// 0 Author: James Jessiman
// 0 !LDRAW_ORG Part UPDATE 2022-05
// 0 !LICENSE Licensed under CC BY 2.0 and CC BY 4.0 : see CAreadme.txt
// 
// 0 BFC CERTIFY CCW
  [0,"BFC","CERTIFY"],
  [0,"BFC","CCW"],
// 
// 0 !HISTORY 2001-10-26 [PTadmin] Official Update 2001-01
// 0 !HISTORY 2002-05-07 {unknown} BFC Certification
// 0 !HISTORY 2002-06-11 [PTadmin] Official Update 2002-03
// 0 !HISTORY 2007-05-07 [PTadmin] Header formatted for Contributor Agreement
// 0 !HISTORY 2008-07-01 [PTadmin] Official Update 2008-01
// 0 !HISTORY 2022-08-04 [MagFors] Using subfile
// 0 !HISTORY 2022-09-15 [PTadmin] Official Update 2022-05
// 
// 
// 1 16 0 0 0 1 0 0 0 1 0 0 0 1 s\3004s01.dat
  [1,16,0,0,0,1,0,0,0,1,0,0,0,1, ldraw_lib__s__3004s01(realsolid)],
// 4 16 -20 24 -10 20 24 -10 20 0 -10 -20 0 -10
  [4,16,-20,24,-10,20,24,-10,20,0,-10,-20,0,-10],
];
module ldraw_lib__3004(step=0, col=false, unit=2/5, alt=false, line=0.2, solid=!$preview)
    makepoly(ldraw_lib__3004(solid), step=step, col=col, unit=unit, alt=alt, line=line, solid=solid);
ldraw_lib__3004(line=0.2);
// file: s/3069bs01.scad
use <../../lib.scad>
use <../../p/box4.scad>
use <../../p/box5.scad>
$fa=1; $fs=0.2;
function ldraw_lib__s__3069bs01(realsolid=false) = [
// 0 ~Tile  1 x  2 with Groove without Top Face
// 0 Name: s\3069bs01.dat
// 0 Author: Santeri Piippo [arezey]
// 0 !LDRAW_ORG Subpart UPDATE 2010-02
// 0 !LICENSE Licensed under CC BY 2.0 and CC BY 4.0 : see CAreadme.txt
// 
// 0 BFC CERTIFY CCW
  [0,"BFC","CERTIFY"],
  [0,"BFC","CCW"],
// 
// 0 !HISTORY 2010-07-05 [PTadmin] Official Update 2010-02
// 
// 
// 1 16 0 0 0 20 0 0 0 7 0 0 0 10 box4.dat
  [1,16,0,0,0,20,0,0,0,7,0,0,0,10, ldraw_lib__box4(realsolid)],
// 1 16 0 7 0 19 0 0 0 1 0 0 0 9 box4.dat
  [1,16,0,7,0,19,0,0,0,1,0,0,0,9, ldraw_lib__box4(realsolid)],
// 0 BFC INVERTNEXT
  [0,"BFC","INVERTNEXT"],
// 1 16 0 8 0 16 0 0 0 -4 0 0 0 6 box5.dat
  [1,16,0,8,0,16,0,0,0,-4,0,0,0,6, ldraw_lib__box5(realsolid)],
// 4 16 -19 8 9 -16 8 6 -16 8 -6 -19 8 -9
  [4,16,-19,8,9,-16,8,6,-16,8,-6,-19,8,-9],
// 4 16 19 8 -9 16 8 -6 16 8 6 19 8 9
  [4,16,19,8,-9,16,8,-6,16,8,6,19,8,9],
// 4 16 19 8 9 16 8 6 -16 8 6 -19 8 9
  [4,16,19,8,9,16,8,6,-16,8,6,-19,8,9],
// 4 16 -19 8 -9 -16 8 -6 16 8 -6 19 8 -9
  [4,16,-19,8,-9,-16,8,-6,16,8,-6,19,8,-9],
// 4 16 -20 7 10 -19 7 9 -19 7 -9 -20 7 -10
  [4,16,-20,7,10,-19,7,9,-19,7,-9,-20,7,-10],
// 4 16 20 7 -10 19 7 -9 19 7 9 20 7 10
  [4,16,20,7,-10,19,7,-9,19,7,9,20,7,10],
// 4 16 20 7 10 19 7 9 -19 7 9 -20 7 10
  [4,16,20,7,10,19,7,9,-19,7,9,-20,7,10],
// 4 16 -20 7 -10 -19 7 -9 19 7 -9 20 7 -10
  [4,16,-20,7,-10,-19,7,-9,19,7,-9,20,7,-10],
// 0 //
];
module ldraw_lib__s__3069bs01(step=0, col=false, unit=2/5, alt=false, line=0.2, solid=!$preview)
    makepoly(ldraw_lib__s__3069bs01(solid), step=step, col=col, unit=unit, alt=alt, line=line, solid=solid);
ldraw_lib__s__3069bs01(line=0.2);
// main file
use <../lib.scad>
use <s/3069bs01.scad>
$fa=1; $fs=0.2;
function ldraw_lib__3069bpza(realsolid=false) = [
// 0 Tile  1 x  2 with Green, Red and Light Bluish Grey Buttons on Metallic Silver Background Pattern
// 0 Name: 3069bpza.dat
// 0 Author: Damien Roux [Darats]
// 0 !LDRAW_ORG Part UPDATE 2019-01
// 0 !LICENSE Licensed under CC BY 2.0 and CC BY 4.0 : see CAreadme.txt
// 
// 0 BFC CERTIFY CCW
  [0,"BFC","CERTIFY"],
  [0,"BFC","CCW"],
// 
// 0 !KEYWORDS Brickheadz, Carbonite, Han Solo, Keyboard, Set 41498
// 
// 0 !HISTORY 2019-06-28 [PTadmin] Official Update 2019-01
// 
// 
// 1 16 0 0 0 1 0 0 0 1 0 0 0 1 s\3069bs01.dat
  [1,16,0,0,0,1,0,0,0,1,0,0,0,1, ldraw_lib__s__3069bs01(realsolid)],
// 4 2 -14.12 0 -4.12 -16.87 0 -4.12 -16.87 0 -6.87 -14.12 0 -6.87
  [4,2,-14.12,0,-4.12,-16.87,0,-4.12,-16.87,0,-6.87,-14.12,0,-6.87],
// 4 2 -14.12 0 -0.46 -16.87 0 -0.46 -16.87 0 -3.21 -14.12 0 -3.21
  [4,2,-14.12,0,-0.46,-16.87,0,-0.46,-16.87,0,-3.21,-14.12,0,-3.21],
// 4 2 -14.12 0 3.21 -16.87 0 3.21 -16.87 0 0.46 -14.12 0 0.46
  [4,2,-14.12,0,3.21,-16.87,0,3.21,-16.87,0,0.46,-14.12,0,0.46],
// 4 2 -14.12 0 6.87 -16.87 0 6.87 -16.87 0 4.12 -14.12 0 4.12
  [4,2,-14.12,0,6.87,-16.87,0,6.87,-16.87,0,4.12,-14.12,0,4.12],
// 4 2 -10.46 0 -4.12 -13.21 0 -4.12 -13.21 0 -6.87 -10.46 0 -6.87
  [4,2,-10.46,0,-4.12,-13.21,0,-4.12,-13.21,0,-6.87,-10.46,0,-6.87],
// 4 2 -10.46 0 -0.46 -13.21 0 -0.46 -13.21 0 -3.21 -10.46 0 -3.21
  [4,2,-10.46,0,-0.46,-13.21,0,-0.46,-13.21,0,-3.21,-10.46,0,-3.21],
// 4 2 -10.46 0 3.21 -13.21 0 3.21 -13.21 0 0.46 -10.46 0 0.46
  [4,2,-10.46,0,3.21,-13.21,0,3.21,-13.21,0,0.46,-10.46,0,0.46],
// 4 2 -13.21 0 4.12 -10.46 0 4.12 -10.46 0 6.87 -13.21 0 6.87
  [4,2,-13.21,0,4.12,-10.46,0,4.12,-10.46,0,6.87,-13.21,0,6.87],
// 4 2 -6.79 0 -4.12 -9.54 0 -4.12 -9.54 0 -6.87 -6.79 0 -6.87
  [4,2,-6.79,0,-4.12,-9.54,0,-4.12,-9.54,0,-6.87,-6.79,0,-6.87],
// 4 2 -6.79 0 -0.46 -9.54 0 -0.46 -9.54 0 -3.21 -6.79 0 -3.21
  [4,2,-6.79,0,-0.46,-9.54,0,-0.46,-9.54,0,-3.21,-6.79,0,-3.21],
// 4 2 -6.79 0 3.21 -9.54 0 3.21 -9.54 0 0.46 -6.79 0 0.46
  [4,2,-6.79,0,3.21,-9.54,0,3.21,-9.54,0,0.46,-6.79,0,0.46],
// 4 2 -6.79 0 6.87 -9.54 0 6.87 -9.54 0 4.12 -6.79 0 4.12
  [4,2,-6.79,0,6.87,-9.54,0,6.87,-9.54,0,4.12,-6.79,0,4.12],
// 4 2 -3.12 0 -4.12 -5.87 0 -4.12 -5.87 0 -6.87 -3.12 0 -6.87
  [4,2,-3.12,0,-4.12,-5.87,0,-4.12,-5.87,0,-6.87,-3.12,0,-6.87],
// 4 2 -3.12 0 -0.46 -5.87 0 -0.46 -5.87 0 -3.21 -3.12 0 -3.21
  [4,2,-3.12,0,-0.46,-5.87,0,-0.46,-5.87,0,-3.21,-3.12,0,-3.21],
// 4 2 -3.12 0 3.21 -5.87 0 3.21 -5.87 0 0.46 -3.12 0 0.46
  [4,2,-3.12,0,3.21,-5.87,0,3.21,-5.87,0,0.46,-3.12,0,0.46],
// 4 2 -3.12 0 6.87 -5.87 0 6.87 -5.87 0 4.12 -3.12 0 4.12
  [4,2,-3.12,0,6.87,-5.87,0,6.87,-5.87,0,4.12,-3.12,0,4.12],
// 4 4 4 0 6.87 -1.5 0 6.87 -1.5 0 -1.83 4 0 -1.83
  [4,4,4,0,6.87,-1.5,0,6.87,-1.5,0,-1.83,4,0,-1.83],
// 4 4 10.44 0 6.87 5.44 0 6.87 5.44 0 3.21 10.44 0 3.21
  [4,4,10.44,0,6.87,5.44,0,6.87,5.44,0,3.21,10.44,0,3.21],
// 4 16 -20 0 -10 -18.5 0 -8.5 -18.5 0 8.5 -20 0 10
  [4,16,-20,0,-10,-18.5,0,-8.5,-18.5,0,8.5,-20,0,10],
// 4 16 20 0 -10 18.5 0 -8.5 -18.5 0 -8.5 -20 0 -10
  [4,16,20,0,-10,18.5,0,-8.5,-18.5,0,-8.5,-20,0,-10],
// 4 16 -20 0 10 -18.5 0 8.5 18.5 0 8.5 20 0 10
  [4,16,-20,0,10,-18.5,0,8.5,18.5,0,8.5,20,0,10],
// 4 16 20 0 10 18.5 0 8.5 18.5 0 -8.5 20 0 -10
  [4,16,20,0,10,18.5,0,8.5,18.5,0,-8.5,20,0,-10],
// 4 71 16.87 0 -3.21 -1.5 0 -3.21 -1.5 0 -6.87 16.87 0 -6.87
  [4,71,16.87,0,-3.21,-1.5,0,-3.21,-1.5,0,-6.87,16.87,0,-6.87],
// 4 71 16.87 0 1.83 5.44 0 1.83 5.44 0 -1.83 16.87 0 -1.83
  [4,71,16.87,0,1.83,5.44,0,1.83,5.44,0,-1.83,16.87,0,-1.83],
// 4 71 16.87 0 6.87 11.87 0 6.87 11.87 0 3.21 16.87 0 3.21
  [4,71,16.87,0,6.87,11.87,0,6.87,11.87,0,3.21,16.87,0,3.21],
// 3 80 -16.87 0 -4.12 -18.5 0 -8.5 -16.87 0 -6.87
  [3,80,-16.87,0,-4.12,-18.5,0,-8.5,-16.87,0,-6.87],
// 3 80 -16.87 0 -3.21 -18.5 0 -8.5 -16.87 0 -4.12
  [3,80,-16.87,0,-3.21,-18.5,0,-8.5,-16.87,0,-4.12],
// 3 80 -18.5 0 8.5 -16.87 0 3.21 -16.87 0 4.12
  [3,80,-18.5,0,8.5,-16.87,0,3.21,-16.87,0,4.12],
// 3 80 -18.5 0 8.5 -16.87 0 0.46 -16.87 0 3.21
  [3,80,-18.5,0,8.5,-16.87,0,0.46,-16.87,0,3.21],
// 4 80 -18.5 0 -8.5 -16.87 0 -3.21 -16.87 0 -0.46 -18.5 0 8.5
  [4,80,-18.5,0,-8.5,-16.87,0,-3.21,-16.87,0,-0.46,-18.5,0,8.5],
// 3 80 -18.5 0 8.5 -16.87 0 -0.46 -16.87 0 0.46
  [3,80,-18.5,0,8.5,-16.87,0,-0.46,-16.87,0,0.46],
// 3 80 -18.5 0 8.5 -16.87 0 4.12 -16.87 0 6.87
  [3,80,-18.5,0,8.5,-16.87,0,4.12,-16.87,0,6.87],
// 3 80 -14.12 0 -6.87 -16.87 0 -6.87 -18.5 0 -8.5
  [3,80,-14.12,0,-6.87,-16.87,0,-6.87,-18.5,0,-8.5],
// 4 80 -14.12 0 -3.21 -16.87 0 -3.21 -16.87 0 -4.12 -14.12 0 -4.12
  [4,80,-14.12,0,-3.21,-16.87,0,-3.21,-16.87,0,-4.12,-14.12,0,-4.12],
// 4 80 -14.12 0 0.46 -16.87 0 0.46 -16.87 0 -0.46 -14.12 0 -0.46
  [4,80,-14.12,0,0.46,-16.87,0,0.46,-16.87,0,-0.46,-14.12,0,-0.46],
// 4 80 -14.12 0 4.12 -16.87 0 4.12 -16.87 0 3.21 -14.12 0 3.21
  [4,80,-14.12,0,4.12,-16.87,0,4.12,-16.87,0,3.21,-14.12,0,3.21],
// 3 80 -18.5 0 8.5 -16.87 0 6.87 -14.12 0 6.87
  [3,80,-18.5,0,8.5,-16.87,0,6.87,-14.12,0,6.87],
// 3 80 -13.21 0 -6.87 -14.12 0 -6.87 -18.5 0 -8.5
  [3,80,-13.21,0,-6.87,-14.12,0,-6.87,-18.5,0,-8.5],
// 4 80 -13.21 0 -4.12 -14.12 0 -4.12 -14.12 0 -6.87 -13.21 0 -6.87
  [4,80,-13.21,0,-4.12,-14.12,0,-4.12,-14.12,0,-6.87,-13.21,0,-6.87],
// 4 80 -13.21 0 -3.21 -14.12 0 -3.21 -14.12 0 -4.12 -13.21 0 -4.12
  [4,80,-13.21,0,-3.21,-14.12,0,-3.21,-14.12,0,-4.12,-13.21,0,-4.12],
// 4 80 -13.21 0 -0.46 -14.12 0 -0.46 -14.12 0 -3.21 -13.21 0 -3.21
  [4,80,-13.21,0,-0.46,-14.12,0,-0.46,-14.12,0,-3.21,-13.21,0,-3.21],
// 4 80 -13.21 0 0.46 -14.12 0 0.46 -14.12 0 -0.46 -13.21 0 -0.46
  [4,80,-13.21,0,0.46,-14.12,0,0.46,-14.12,0,-0.46,-13.21,0,-0.46],
// 4 80 -13.21 0 3.21 -14.12 0 3.21 -14.12 0 0.46 -13.21 0 0.46
  [4,80,-13.21,0,3.21,-14.12,0,3.21,-14.12,0,0.46,-13.21,0,0.46],
// 4 80 -13.21 0 4.12 -14.12 0 4.12 -14.12 0 3.21 -13.21 0 3.21
  [4,80,-13.21,0,4.12,-14.12,0,4.12,-14.12,0,3.21,-13.21,0,3.21],
// 4 80 -13.21 0 6.87 -14.12 0 6.87 -14.12 0 4.12 -13.21 0 4.12
  [4,80,-13.21,0,6.87,-14.12,0,6.87,-14.12,0,4.12,-13.21,0,4.12],
// 3 80 -18.5 0 8.5 -14.12 0 6.87 -13.21 0 6.87
  [3,80,-18.5,0,8.5,-14.12,0,6.87,-13.21,0,6.87],
// 3 80 -10.46 0 -6.87 -13.21 0 -6.87 -18.5 0 -8.5
  [3,80,-10.46,0,-6.87,-13.21,0,-6.87,-18.5,0,-8.5],
// 4 80 -10.46 0 -3.21 -13.21 0 -3.21 -13.21 0 -4.12 -10.46 0 -4.12
  [4,80,-10.46,0,-3.21,-13.21,0,-3.21,-13.21,0,-4.12,-10.46,0,-4.12],
// 4 80 -10.46 0 0.46 -13.21 0 0.46 -13.21 0 -0.46 -10.46 0 -0.46
  [4,80,-10.46,0,0.46,-13.21,0,0.46,-13.21,0,-0.46,-10.46,0,-0.46],
// 4 80 -10.46 0 4.12 -13.21 0 4.12 -13.21 0 3.21 -10.46 0 3.21
  [4,80,-10.46,0,4.12,-13.21,0,4.12,-13.21,0,3.21,-10.46,0,3.21],
// 3 80 -18.5 0 8.5 -13.21 0 6.87 -10.46 0 6.87
  [3,80,-18.5,0,8.5,-13.21,0,6.87,-10.46,0,6.87],
// 3 80 -9.54 0 -6.87 -10.46 0 -6.87 -18.5 0 -8.5
  [3,80,-9.54,0,-6.87,-10.46,0,-6.87,-18.5,0,-8.5],
// 4 80 -9.54 0 -4.12 -10.46 0 -4.12 -10.46 0 -6.87 -9.54 0 -6.87
  [4,80,-9.54,0,-4.12,-10.46,0,-4.12,-10.46,0,-6.87,-9.54,0,-6.87],
// 4 80 -9.54 0 -3.21 -10.46 0 -3.21 -10.46 0 -4.12 -9.54 0 -4.12
  [4,80,-9.54,0,-3.21,-10.46,0,-3.21,-10.46,0,-4.12,-9.54,0,-4.12],
// 4 80 -9.54 0 -0.46 -10.46 0 -0.46 -10.46 0 -3.21 -9.54 0 -3.21
  [4,80,-9.54,0,-0.46,-10.46,0,-0.46,-10.46,0,-3.21,-9.54,0,-3.21],
// 4 80 -9.54 0 0.46 -10.46 0 0.46 -10.46 0 -0.46 -9.54 0 -0.46
  [4,80,-9.54,0,0.46,-10.46,0,0.46,-10.46,0,-0.46,-9.54,0,-0.46],
// 4 80 -9.54 0 3.21 -10.46 0 3.21 -10.46 0 0.46 -9.54 0 0.46
  [4,80,-9.54,0,3.21,-10.46,0,3.21,-10.46,0,0.46,-9.54,0,0.46],
// 4 80 -9.54 0 4.12 -10.46 0 4.12 -10.46 0 3.21 -9.54 0 3.21
  [4,80,-9.54,0,4.12,-10.46,0,4.12,-10.46,0,3.21,-9.54,0,3.21],
// 4 80 -9.54 0 6.87 -10.46 0 6.87 -10.46 0 4.12 -9.54 0 4.12
  [4,80,-9.54,0,6.87,-10.46,0,6.87,-10.46,0,4.12,-9.54,0,4.12],
// 3 80 -18.5 0 8.5 -10.46 0 6.87 -9.54 0 6.87
  [3,80,-18.5,0,8.5,-10.46,0,6.87,-9.54,0,6.87],
// 3 80 -6.79 0 -6.87 -9.54 0 -6.87 -18.5 0 -8.5
  [3,80,-6.79,0,-6.87,-9.54,0,-6.87,-18.5,0,-8.5],
// 4 80 -6.79 0 -3.21 -9.54 0 -3.21 -9.54 0 -4.12 -6.79 0 -4.12
  [4,80,-6.79,0,-3.21,-9.54,0,-3.21,-9.54,0,-4.12,-6.79,0,-4.12],
// 4 80 -6.79 0 0.46 -9.54 0 0.46 -9.54 0 -0.46 -6.79 0 -0.46
  [4,80,-6.79,0,0.46,-9.54,0,0.46,-9.54,0,-0.46,-6.79,0,-0.46],
// 4 80 -6.79 0 4.12 -9.54 0 4.12 -9.54 0 3.21 -6.79 0 3.21
  [4,80,-6.79,0,4.12,-9.54,0,4.12,-9.54,0,3.21,-6.79,0,3.21],
// 3 80 -18.5 0 8.5 -9.54 0 6.87 -6.79 0 6.87
  [3,80,-18.5,0,8.5,-9.54,0,6.87,-6.79,0,6.87],
// 3 80 -5.87 0 -6.87 -6.79 0 -6.87 -18.5 0 -8.5
  [3,80,-5.87,0,-6.87,-6.79,0,-6.87,-18.5,0,-8.5],
// 4 80 -5.87 0 -4.12 -6.79 0 -4.12 -6.79 0 -6.87 -5.87 0 -6.87
  [4,80,-5.87,0,-4.12,-6.79,0,-4.12,-6.79,0,-6.87,-5.87,0,-6.87],
// 4 80 -5.87 0 -3.21 -6.79 0 -3.21 -6.79 0 -4.12 -5.87 0 -4.12
  [4,80,-5.87,0,-3.21,-6.79,0,-3.21,-6.79,0,-4.12,-5.87,0,-4.12],
// 4 80 -5.87 0 -0.46 -6.79 0 -0.46 -6.79 0 -3.21 -5.87 0 -3.21
  [4,80,-5.87,0,-0.46,-6.79,0,-0.46,-6.79,0,-3.21,-5.87,0,-3.21],
// 4 80 -5.87 0 0.46 -6.79 0 0.46 -6.79 0 -0.46 -5.87 0 -0.46
  [4,80,-5.87,0,0.46,-6.79,0,0.46,-6.79,0,-0.46,-5.87,0,-0.46],
// 4 80 -5.87 0 3.21 -6.79 0 3.21 -6.79 0 0.46 -5.87 0 0.46
  [4,80,-5.87,0,3.21,-6.79,0,3.21,-6.79,0,0.46,-5.87,0,0.46],
// 4 80 -5.87 0 4.12 -6.79 0 4.12 -6.79 0 3.21 -5.87 0 3.21
  [4,80,-5.87,0,4.12,-6.79,0,4.12,-6.79,0,3.21,-5.87,0,3.21],
// 4 80 -5.87 0 6.87 -6.79 0 6.87 -6.79 0 4.12 -5.87 0 4.12
  [4,80,-5.87,0,6.87,-6.79,0,6.87,-6.79,0,4.12,-5.87,0,4.12],
// 3 80 -18.5 0 8.5 -6.79 0 6.87 -5.87 0 6.87
  [3,80,-18.5,0,8.5,-6.79,0,6.87,-5.87,0,6.87],
// 3 80 -3.12 0 -6.87 -5.87 0 -6.87 -18.5 0 -8.5
  [3,80,-3.12,0,-6.87,-5.87,0,-6.87,-18.5,0,-8.5],
// 4 80 -3.12 0 -3.21 -5.87 0 -3.21 -5.87 0 -4.12 -3.12 0 -4.12
  [4,80,-3.12,0,-3.21,-5.87,0,-3.21,-5.87,0,-4.12,-3.12,0,-4.12],
// 4 80 -3.12 0 0.46 -5.87 0 0.46 -5.87 0 -0.46 -3.12 0 -0.46
  [4,80,-3.12,0,0.46,-5.87,0,0.46,-5.87,0,-0.46,-3.12,0,-0.46],
// 4 80 -3.12 0 4.12 -5.87 0 4.12 -5.87 0 3.21 -3.12 0 3.21
  [4,80,-3.12,0,4.12,-5.87,0,4.12,-5.87,0,3.21,-3.12,0,3.21],
// 3 80 -18.5 0 8.5 -5.87 0 6.87 -3.12 0 6.87
  [3,80,-18.5,0,8.5,-5.87,0,6.87,-3.12,0,6.87],
// 3 80 -1.5 0 -6.87 -3.12 0 -6.87 -18.5 0 -8.5
  [3,80,-1.5,0,-6.87,-3.12,0,-6.87,-18.5,0,-8.5],
// 3 80 -3.12 0 -4.12 -3.12 0 -6.87 -1.5 0 -6.87
  [3,80,-3.12,0,-4.12,-3.12,0,-6.87,-1.5,0,-6.87],
// 4 80 -1.5 0 -3.21 -3.12 0 -3.21 -3.12 0 -4.12 -1.5 0 -6.87
  [4,80,-1.5,0,-3.21,-3.12,0,-3.21,-3.12,0,-4.12,-1.5,0,-6.87],
// 3 80 -3.12 0 -0.46 -3.12 0 -3.21 -1.5 0 -3.21
  [3,80,-3.12,0,-0.46,-3.12,0,-3.21,-1.5,0,-3.21],
// 4 80 -1.5 0 -1.83 -3.12 0 0.46 -3.12 0 -0.46 -1.5 0 -3.21
  [4,80,-1.5,0,-1.83,-3.12,0,0.46,-3.12,0,-0.46,-1.5,0,-3.21],
// 4 80 -1.5 0 6.87 -3.12 0 3.21 -3.12 0 0.46 -1.5 0 -1.83
  [4,80,-1.5,0,6.87,-3.12,0,3.21,-3.12,0,0.46,-1.5,0,-1.83],
// 3 80 -1.5 0 6.87 -3.12 0 4.12 -3.12 0 3.21
  [3,80,-1.5,0,6.87,-3.12,0,4.12,-3.12,0,3.21],
// 3 80 -1.5 0 6.87 -3.12 0 6.87 -3.12 0 4.12
  [3,80,-1.5,0,6.87,-3.12,0,6.87,-3.12,0,4.12],
// 3 80 -18.5 0 8.5 -3.12 0 6.87 -1.5 0 6.87
  [3,80,-18.5,0,8.5,-3.12,0,6.87,-1.5,0,6.87],
// 3 80 4 0 -1.83 -1.5 0 -1.83 -1.5 0 -3.21
  [3,80,4,0,-1.83,-1.5,0,-1.83,-1.5,0,-3.21],
// 3 80 5.44 0 1.83 4 0 -1.83 5.44 0 -1.83
  [3,80,5.44,0,1.83,4,0,-1.83,5.44,0,-1.83],
// 3 80 5.44 0 6.87 4 0 6.87 5.44 0 3.21
  [3,80,5.44,0,6.87,4,0,6.87,5.44,0,3.21],
// 4 80 5.44 0 1.83 5.44 0 3.21 4 0 6.87 4 0 -1.83
  [4,80,5.44,0,1.83,5.44,0,3.21,4,0,6.87,4,0,-1.83],
// 3 80 10.44 0 3.21 5.44 0 3.21 5.44 0 1.83
  [3,80,10.44,0,3.21,5.44,0,3.21,5.44,0,1.83],
// 4 80 11.87 0 6.87 10.44 0 6.87 10.44 0 3.21 11.87 0 3.21
  [4,80,11.87,0,6.87,10.44,0,6.87,10.44,0,3.21,11.87,0,3.21],
// 3 80 16.87 0 -1.83 5.44 0 -1.83 16.87 0 -3.21
  [3,80,16.87,0,-1.83,5.44,0,-1.83,16.87,0,-3.21],
// 4 80 5.44 0 -1.83 4 0 -1.83 -1.5 0 -3.21 16.87 0 -3.21
  [4,80,5.44,0,-1.83,4,0,-1.83,-1.5,0,-3.21,16.87,0,-3.21],
// 3 80 16.87 0 3.21 11.87 0 3.21 16.87 0 1.83
  [3,80,16.87,0,3.21,11.87,0,3.21,16.87,0,1.83],
// 4 80 11.87 0 3.21 10.44 0 3.21 5.44 0 1.83 16.87 0 1.83
  [4,80,11.87,0,3.21,10.44,0,3.21,5.44,0,1.83,16.87,0,1.83],
// 4 80 18.5 0 -8.5 16.87 0 -6.87 -1.5 0 -6.87 -18.5 0 -8.5
  [4,80,18.5,0,-8.5,16.87,0,-6.87,-1.5,0,-6.87,-18.5,0,-8.5],
// 3 80 18.5 0 -8.5 16.87 0 -1.83 16.87 0 -3.21
  [3,80,18.5,0,-8.5,16.87,0,-1.83,16.87,0,-3.21],
// 3 80 18.5 0 -8.5 16.87 0 -3.21 16.87 0 -6.87
  [3,80,18.5,0,-8.5,16.87,0,-3.21,16.87,0,-6.87],
// 4 80 18.5 0 8.5 16.87 0 1.83 16.87 0 -1.83 18.5 0 -8.5
  [4,80,18.5,0,8.5,16.87,0,1.83,16.87,0,-1.83,18.5,0,-8.5],
// 3 80 18.5 0 8.5 10.44 0 6.87 11.87 0 6.87
  [3,80,18.5,0,8.5,10.44,0,6.87,11.87,0,6.87],
// 3 80 18.5 0 8.5 16.87 0 6.87 16.87 0 3.21
  [3,80,18.5,0,8.5,16.87,0,6.87,16.87,0,3.21],
// 3 80 18.5 0 8.5 16.87 0 3.21 16.87 0 1.83
  [3,80,18.5,0,8.5,16.87,0,3.21,16.87,0,1.83],
// 4 80 -18.5 0 8.5 -1.5 0 6.87 4 0 6.87 18.5 0 8.5
  [4,80,-18.5,0,8.5,-1.5,0,6.87,4,0,6.87,18.5,0,8.5],
// 3 80 18.5 0 8.5 11.87 0 6.87 16.87 0 6.87
  [3,80,18.5,0,8.5,11.87,0,6.87,16.87,0,6.87],
// 3 80 18.5 0 8.5 5.44 0 6.87 10.44 0 6.87
  [3,80,18.5,0,8.5,5.44,0,6.87,10.44,0,6.87],
// 3 80 18.5 0 8.5 4 0 6.87 5.44 0 6.87
  [3,80,18.5,0,8.5,4,0,6.87,5.44,0,6.87],
];
module ldraw_lib__3069bpza(step=0, col=false, unit=2/5, alt=false, line=0.2, solid=!$preview)
    makepoly(ldraw_lib__3069bpza(solid), step=step, col=col, unit=unit, alt=alt, line=line, solid=solid);
ldraw_lib__3069bpza(line=0.2);
